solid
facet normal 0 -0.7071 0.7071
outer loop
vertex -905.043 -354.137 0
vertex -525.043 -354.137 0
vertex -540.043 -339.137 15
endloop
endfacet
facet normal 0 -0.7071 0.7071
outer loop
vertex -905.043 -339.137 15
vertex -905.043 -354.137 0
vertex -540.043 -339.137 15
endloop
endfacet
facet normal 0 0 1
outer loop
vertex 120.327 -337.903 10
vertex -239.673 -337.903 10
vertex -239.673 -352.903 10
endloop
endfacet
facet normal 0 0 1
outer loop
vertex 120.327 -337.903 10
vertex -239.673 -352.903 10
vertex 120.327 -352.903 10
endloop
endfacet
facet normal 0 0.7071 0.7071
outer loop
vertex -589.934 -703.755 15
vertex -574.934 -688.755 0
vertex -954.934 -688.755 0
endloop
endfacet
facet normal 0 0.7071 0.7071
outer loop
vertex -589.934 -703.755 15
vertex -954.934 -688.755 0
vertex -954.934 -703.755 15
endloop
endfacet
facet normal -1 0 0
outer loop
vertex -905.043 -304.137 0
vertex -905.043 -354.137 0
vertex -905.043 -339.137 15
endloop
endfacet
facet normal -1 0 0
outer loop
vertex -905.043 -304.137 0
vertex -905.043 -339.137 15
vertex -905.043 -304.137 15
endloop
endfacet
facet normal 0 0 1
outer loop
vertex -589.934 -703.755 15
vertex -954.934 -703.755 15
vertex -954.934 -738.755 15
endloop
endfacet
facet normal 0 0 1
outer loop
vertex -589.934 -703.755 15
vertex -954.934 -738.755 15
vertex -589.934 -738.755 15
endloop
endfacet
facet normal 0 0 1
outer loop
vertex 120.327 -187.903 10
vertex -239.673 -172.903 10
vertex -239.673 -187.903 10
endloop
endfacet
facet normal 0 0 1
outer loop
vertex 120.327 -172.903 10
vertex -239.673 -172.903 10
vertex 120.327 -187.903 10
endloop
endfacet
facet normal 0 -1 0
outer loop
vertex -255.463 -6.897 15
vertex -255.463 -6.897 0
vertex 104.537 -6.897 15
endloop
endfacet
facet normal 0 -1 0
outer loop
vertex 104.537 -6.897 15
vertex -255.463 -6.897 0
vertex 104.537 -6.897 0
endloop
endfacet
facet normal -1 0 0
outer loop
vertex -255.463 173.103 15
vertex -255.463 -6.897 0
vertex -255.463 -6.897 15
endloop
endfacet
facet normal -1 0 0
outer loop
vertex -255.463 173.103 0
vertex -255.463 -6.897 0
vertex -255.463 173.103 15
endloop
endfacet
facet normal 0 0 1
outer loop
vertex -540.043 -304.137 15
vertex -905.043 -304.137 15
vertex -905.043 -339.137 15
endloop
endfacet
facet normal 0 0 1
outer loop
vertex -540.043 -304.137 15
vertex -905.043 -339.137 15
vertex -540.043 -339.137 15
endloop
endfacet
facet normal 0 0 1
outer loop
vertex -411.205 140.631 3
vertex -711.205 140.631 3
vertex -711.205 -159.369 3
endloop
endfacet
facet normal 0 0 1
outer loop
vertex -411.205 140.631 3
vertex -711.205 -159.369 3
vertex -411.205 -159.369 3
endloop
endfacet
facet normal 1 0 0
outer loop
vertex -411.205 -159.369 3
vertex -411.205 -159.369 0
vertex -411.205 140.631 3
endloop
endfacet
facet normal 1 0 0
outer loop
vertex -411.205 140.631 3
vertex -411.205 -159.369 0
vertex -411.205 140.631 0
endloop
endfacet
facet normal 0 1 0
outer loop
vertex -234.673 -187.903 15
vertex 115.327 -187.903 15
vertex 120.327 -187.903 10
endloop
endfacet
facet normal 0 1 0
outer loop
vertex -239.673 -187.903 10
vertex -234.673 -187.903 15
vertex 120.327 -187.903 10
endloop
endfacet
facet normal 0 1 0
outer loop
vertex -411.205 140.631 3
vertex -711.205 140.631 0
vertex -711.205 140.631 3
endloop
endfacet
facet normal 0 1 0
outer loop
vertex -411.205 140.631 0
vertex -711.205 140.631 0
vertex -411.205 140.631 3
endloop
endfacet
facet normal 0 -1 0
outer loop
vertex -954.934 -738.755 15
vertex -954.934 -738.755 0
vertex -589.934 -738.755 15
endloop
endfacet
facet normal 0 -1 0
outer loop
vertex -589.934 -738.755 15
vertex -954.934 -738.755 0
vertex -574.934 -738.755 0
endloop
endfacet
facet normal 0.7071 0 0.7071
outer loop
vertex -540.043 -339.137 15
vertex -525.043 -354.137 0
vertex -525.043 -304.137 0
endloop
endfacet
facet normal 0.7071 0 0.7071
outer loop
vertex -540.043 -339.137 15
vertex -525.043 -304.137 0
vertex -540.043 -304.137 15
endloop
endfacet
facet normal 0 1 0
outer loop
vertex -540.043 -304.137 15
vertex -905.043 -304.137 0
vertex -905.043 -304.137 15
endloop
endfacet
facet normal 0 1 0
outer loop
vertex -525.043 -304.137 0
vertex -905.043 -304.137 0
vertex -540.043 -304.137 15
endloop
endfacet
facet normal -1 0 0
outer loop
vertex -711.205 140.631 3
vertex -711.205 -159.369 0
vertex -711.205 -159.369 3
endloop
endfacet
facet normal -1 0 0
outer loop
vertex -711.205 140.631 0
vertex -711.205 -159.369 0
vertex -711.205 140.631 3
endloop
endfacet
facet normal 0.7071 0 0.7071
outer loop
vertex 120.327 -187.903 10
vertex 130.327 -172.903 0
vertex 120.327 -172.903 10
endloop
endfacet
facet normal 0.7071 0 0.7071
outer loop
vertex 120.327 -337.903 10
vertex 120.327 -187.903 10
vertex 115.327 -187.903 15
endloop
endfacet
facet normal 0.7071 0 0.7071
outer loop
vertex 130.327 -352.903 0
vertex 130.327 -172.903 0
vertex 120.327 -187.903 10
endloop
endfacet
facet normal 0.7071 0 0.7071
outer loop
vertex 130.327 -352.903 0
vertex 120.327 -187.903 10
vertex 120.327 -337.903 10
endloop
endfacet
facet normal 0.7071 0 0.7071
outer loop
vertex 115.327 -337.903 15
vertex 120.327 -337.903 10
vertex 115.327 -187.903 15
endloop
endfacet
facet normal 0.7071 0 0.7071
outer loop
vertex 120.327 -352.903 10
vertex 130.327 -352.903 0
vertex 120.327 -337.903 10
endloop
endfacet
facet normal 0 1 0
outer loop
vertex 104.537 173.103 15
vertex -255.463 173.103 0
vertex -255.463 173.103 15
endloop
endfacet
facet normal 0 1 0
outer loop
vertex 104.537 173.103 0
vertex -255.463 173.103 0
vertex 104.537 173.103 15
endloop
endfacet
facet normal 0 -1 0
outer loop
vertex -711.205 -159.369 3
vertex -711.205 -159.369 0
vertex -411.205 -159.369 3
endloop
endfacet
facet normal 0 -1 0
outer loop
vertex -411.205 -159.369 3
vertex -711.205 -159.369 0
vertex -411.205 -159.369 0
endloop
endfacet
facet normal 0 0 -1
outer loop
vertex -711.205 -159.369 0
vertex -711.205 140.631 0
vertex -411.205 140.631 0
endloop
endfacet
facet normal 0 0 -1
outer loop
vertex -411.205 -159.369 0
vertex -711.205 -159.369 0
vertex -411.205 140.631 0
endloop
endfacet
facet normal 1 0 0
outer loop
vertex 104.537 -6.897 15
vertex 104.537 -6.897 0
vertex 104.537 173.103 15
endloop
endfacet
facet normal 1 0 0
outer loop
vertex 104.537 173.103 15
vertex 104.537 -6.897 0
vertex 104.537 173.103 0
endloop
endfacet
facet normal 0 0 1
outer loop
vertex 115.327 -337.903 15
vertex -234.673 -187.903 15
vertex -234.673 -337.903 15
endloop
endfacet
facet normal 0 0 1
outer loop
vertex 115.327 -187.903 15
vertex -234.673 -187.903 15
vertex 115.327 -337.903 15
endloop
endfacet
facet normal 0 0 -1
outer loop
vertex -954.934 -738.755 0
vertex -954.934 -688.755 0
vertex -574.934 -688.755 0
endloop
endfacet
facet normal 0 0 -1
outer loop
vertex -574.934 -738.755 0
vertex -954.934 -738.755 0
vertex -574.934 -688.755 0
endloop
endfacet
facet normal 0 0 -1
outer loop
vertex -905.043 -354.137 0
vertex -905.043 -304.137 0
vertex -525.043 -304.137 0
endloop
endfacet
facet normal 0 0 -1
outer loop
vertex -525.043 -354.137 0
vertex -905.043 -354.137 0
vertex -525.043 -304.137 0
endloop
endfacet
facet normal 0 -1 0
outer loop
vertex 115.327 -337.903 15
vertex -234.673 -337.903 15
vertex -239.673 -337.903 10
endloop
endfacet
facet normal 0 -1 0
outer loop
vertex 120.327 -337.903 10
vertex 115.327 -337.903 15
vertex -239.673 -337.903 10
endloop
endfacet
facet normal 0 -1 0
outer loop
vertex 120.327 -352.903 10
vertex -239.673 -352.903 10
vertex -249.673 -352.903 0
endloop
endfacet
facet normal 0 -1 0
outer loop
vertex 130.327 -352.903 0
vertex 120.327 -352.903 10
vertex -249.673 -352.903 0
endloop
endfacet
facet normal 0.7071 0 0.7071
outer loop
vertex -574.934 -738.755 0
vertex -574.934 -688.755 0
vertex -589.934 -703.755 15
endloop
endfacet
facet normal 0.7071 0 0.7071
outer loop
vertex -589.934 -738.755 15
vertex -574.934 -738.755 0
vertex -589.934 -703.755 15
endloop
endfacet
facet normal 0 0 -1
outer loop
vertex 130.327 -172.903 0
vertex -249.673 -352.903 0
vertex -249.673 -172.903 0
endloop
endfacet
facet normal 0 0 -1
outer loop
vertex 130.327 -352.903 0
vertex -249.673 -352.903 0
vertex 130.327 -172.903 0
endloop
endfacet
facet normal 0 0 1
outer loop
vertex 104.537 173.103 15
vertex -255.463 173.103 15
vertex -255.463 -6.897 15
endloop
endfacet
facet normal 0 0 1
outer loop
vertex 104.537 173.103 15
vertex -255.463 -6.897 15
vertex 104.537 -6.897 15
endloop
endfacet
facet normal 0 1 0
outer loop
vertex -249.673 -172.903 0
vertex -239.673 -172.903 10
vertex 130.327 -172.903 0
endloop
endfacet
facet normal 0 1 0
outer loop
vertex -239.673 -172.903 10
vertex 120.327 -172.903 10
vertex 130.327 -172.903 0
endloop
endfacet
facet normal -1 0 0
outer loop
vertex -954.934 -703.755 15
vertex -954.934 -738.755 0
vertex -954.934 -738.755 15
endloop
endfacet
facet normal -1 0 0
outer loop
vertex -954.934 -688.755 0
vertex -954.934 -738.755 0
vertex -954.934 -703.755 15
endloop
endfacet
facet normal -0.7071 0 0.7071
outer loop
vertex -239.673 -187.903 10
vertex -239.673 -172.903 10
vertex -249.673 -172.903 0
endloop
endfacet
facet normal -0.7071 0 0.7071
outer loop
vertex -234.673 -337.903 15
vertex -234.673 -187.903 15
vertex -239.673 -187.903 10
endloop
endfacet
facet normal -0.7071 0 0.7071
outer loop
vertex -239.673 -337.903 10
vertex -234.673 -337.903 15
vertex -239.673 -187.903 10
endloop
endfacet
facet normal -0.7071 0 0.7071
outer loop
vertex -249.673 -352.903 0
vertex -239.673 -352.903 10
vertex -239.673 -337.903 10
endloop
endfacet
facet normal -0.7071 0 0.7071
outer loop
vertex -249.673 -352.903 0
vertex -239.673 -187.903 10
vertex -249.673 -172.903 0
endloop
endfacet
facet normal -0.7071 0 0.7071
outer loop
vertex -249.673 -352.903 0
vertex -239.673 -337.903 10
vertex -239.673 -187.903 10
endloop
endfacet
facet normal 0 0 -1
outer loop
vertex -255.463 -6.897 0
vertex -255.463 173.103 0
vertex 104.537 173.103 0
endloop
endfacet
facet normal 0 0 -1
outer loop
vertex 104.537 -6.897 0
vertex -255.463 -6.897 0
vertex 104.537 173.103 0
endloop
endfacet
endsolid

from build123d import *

# Parameters (mm, degrees)
F0_W      = 360
F0_H      = 180
F1_DEPTH  = 15
F2_W      = 350
F2_H      = 180
F3_DEPTH  = 15
F5_DEPTH  = 180
F6_W      = 350
F6_H      = 15
F6_W_2    = 38.8306975365
F6_W_3    = 75.8310049772
F7_DEPTH  = 5
F8_W      = 350
F8_H      = 15
F8_W_2    = 57.6145350933
F8_W_3    = 54.2813926935
F9_DEPTH  = 5
F10_W     = 300
F10_H     = 300
F11_DEPTH = 3
F12_W     = 380
F12_H     = 50
F13_DEPTH = 15
F15_DEPTH = 551
F17_DEPTH = 79
F18_W     = 380
F18_H     = 50
F19_DEPTH = 15
F21_DEPTH = 76
F23_DEPTH = 513.3


with BuildPart() as f1:
    # F0 (on Top) → F1 (new body)
    with BuildSketch(Plane.XY):
        with Locations((-75.4632055759, 83.1025231441)):
            Rectangle(F0_W, F0_H)
    extrude(amount=F1_DEPTH)


with BuildPart() as f3:
    # F2 (on Top) → F3 (new body)
    with BuildSketch(Plane.XY):
        with Locations((-59.6732020378, -262.903097868)):
            Rectangle(F2_W, F2_H)
    extrude(amount=F3_DEPTH)

    # F4 (on face) → F5 (join)
    with BuildSketch(Plane.XZ.offset(352.903097868)):
        Polygon((-249.6732020378, 0), (-234.6732020378, 0), (-234.6732020378, 15), align=None)
        Polygon((115.3267979622, 15), (115.3267979622, 0), (130.3267979622, 0), align=None)
    extrude(amount=-F5_DEPTH)

    # F6 (on face) → F7 (cut)
    with BuildSketch(Plane.XY.offset(15)):
        with Locations((-59.6732020378, -180.403097868)):
            Rectangle(F6_W, F6_H)
        with Locations((-254.088550806, -180.403097868)):
            Rectangle(F6_W_2, F6_H)
        with Locations((153.2423004508, -180.403097868)):
            Rectangle(F6_W_3, F6_H)
    extrude(amount=-F7_DEPTH, mode=Mode.SUBTRACT)

    # F8 (on face) → F9 (cut)
    with BuildSketch(Plane.XY.offset(15)):
        with Locations((-59.6732020378, -345.403097868)):
            Rectangle(F8_W, F8_H)
        with Locations((-263.4804695845, -345.403097868)):
            Rectangle(F8_W_2, F8_H)
        with Locations((142.4674943089, -345.403097868)):
            Rectangle(F8_W_3, F8_H)
    extrude(amount=-F9_DEPTH, mode=Mode.SUBTRACT)


with BuildPart() as f11:
    # F10 (on Top) → F11 (new body)
    with BuildSketch(Plane.XY):
        with Locations((-561.2048864365, -9.3687683344)):
            Rectangle(F10_W, F10_H)
    extrude(amount=F11_DEPTH)


with BuildPart() as f13:
    # F12 (on Top) → F13 (new body)
    with BuildSketch(Plane.XY):
        with Locations((-715.0434231758, -329.1367352009)):
            Rectangle(F12_W, F12_H)
    extrude(amount=F13_DEPTH)

    # F14 (on face) → F15 (cut)
    with BuildSketch(Plane.YZ.offset(-525.0434231758)):
        Polygon((-354.1367352009, 15), (-354.1367352009, 0), (-339.1367352009, 15), align=None)
    extrude(amount=-F15_DEPTH, mode=Mode.SUBTRACT)

    # F16 (on face) → F17 (cut)
    with BuildSketch(Plane(origin=(0, -304.1367352009, 0), x_dir=(-1, 0, 0), z_dir=(0, 1, 0))):
        Polygon((525.0434231758, 15), (525.0434231758, 0), (540.0434231758, 15), align=None)
    extrude(amount=-F17_DEPTH, mode=Mode.SUBTRACT)


with BuildPart() as f19:
    # F18 (on Top) → F19 (new body)
    with BuildSketch(Plane.XY):
        with Locations((-764.9335837364, -713.7545704842)):
            Rectangle(F18_W, F18_H)
    extrude(amount=F19_DEPTH)

    # F20 (on face) → F21 (cut)
    with BuildSketch(Plane(origin=(0, -688.7545704842, 0), x_dir=(-1, 0, 0), z_dir=(0, 1, 0))):
        Polygon((574.9335837364, 15), (574.9335837364, 0), (589.9335837364, 15), align=None)
    extrude(amount=-F21_DEPTH, mode=Mode.SUBTRACT)

    # F22 (on face) → F23 (cut)
    with BuildSketch(Plane(origin=(-954.9335837364, 0, 0), x_dir=(0, -1, 0), z_dir=(-1, 0, 0))):
        Polygon((688.7545704842, 15), (688.7545704842, 0), (703.7545704842, 15), align=None)
    extrude(amount=-F23_DEPTH, mode=Mode.SUBTRACT)


solid = Compound([f1.part, f3.part, f11.part, f13.part, f19.part])
